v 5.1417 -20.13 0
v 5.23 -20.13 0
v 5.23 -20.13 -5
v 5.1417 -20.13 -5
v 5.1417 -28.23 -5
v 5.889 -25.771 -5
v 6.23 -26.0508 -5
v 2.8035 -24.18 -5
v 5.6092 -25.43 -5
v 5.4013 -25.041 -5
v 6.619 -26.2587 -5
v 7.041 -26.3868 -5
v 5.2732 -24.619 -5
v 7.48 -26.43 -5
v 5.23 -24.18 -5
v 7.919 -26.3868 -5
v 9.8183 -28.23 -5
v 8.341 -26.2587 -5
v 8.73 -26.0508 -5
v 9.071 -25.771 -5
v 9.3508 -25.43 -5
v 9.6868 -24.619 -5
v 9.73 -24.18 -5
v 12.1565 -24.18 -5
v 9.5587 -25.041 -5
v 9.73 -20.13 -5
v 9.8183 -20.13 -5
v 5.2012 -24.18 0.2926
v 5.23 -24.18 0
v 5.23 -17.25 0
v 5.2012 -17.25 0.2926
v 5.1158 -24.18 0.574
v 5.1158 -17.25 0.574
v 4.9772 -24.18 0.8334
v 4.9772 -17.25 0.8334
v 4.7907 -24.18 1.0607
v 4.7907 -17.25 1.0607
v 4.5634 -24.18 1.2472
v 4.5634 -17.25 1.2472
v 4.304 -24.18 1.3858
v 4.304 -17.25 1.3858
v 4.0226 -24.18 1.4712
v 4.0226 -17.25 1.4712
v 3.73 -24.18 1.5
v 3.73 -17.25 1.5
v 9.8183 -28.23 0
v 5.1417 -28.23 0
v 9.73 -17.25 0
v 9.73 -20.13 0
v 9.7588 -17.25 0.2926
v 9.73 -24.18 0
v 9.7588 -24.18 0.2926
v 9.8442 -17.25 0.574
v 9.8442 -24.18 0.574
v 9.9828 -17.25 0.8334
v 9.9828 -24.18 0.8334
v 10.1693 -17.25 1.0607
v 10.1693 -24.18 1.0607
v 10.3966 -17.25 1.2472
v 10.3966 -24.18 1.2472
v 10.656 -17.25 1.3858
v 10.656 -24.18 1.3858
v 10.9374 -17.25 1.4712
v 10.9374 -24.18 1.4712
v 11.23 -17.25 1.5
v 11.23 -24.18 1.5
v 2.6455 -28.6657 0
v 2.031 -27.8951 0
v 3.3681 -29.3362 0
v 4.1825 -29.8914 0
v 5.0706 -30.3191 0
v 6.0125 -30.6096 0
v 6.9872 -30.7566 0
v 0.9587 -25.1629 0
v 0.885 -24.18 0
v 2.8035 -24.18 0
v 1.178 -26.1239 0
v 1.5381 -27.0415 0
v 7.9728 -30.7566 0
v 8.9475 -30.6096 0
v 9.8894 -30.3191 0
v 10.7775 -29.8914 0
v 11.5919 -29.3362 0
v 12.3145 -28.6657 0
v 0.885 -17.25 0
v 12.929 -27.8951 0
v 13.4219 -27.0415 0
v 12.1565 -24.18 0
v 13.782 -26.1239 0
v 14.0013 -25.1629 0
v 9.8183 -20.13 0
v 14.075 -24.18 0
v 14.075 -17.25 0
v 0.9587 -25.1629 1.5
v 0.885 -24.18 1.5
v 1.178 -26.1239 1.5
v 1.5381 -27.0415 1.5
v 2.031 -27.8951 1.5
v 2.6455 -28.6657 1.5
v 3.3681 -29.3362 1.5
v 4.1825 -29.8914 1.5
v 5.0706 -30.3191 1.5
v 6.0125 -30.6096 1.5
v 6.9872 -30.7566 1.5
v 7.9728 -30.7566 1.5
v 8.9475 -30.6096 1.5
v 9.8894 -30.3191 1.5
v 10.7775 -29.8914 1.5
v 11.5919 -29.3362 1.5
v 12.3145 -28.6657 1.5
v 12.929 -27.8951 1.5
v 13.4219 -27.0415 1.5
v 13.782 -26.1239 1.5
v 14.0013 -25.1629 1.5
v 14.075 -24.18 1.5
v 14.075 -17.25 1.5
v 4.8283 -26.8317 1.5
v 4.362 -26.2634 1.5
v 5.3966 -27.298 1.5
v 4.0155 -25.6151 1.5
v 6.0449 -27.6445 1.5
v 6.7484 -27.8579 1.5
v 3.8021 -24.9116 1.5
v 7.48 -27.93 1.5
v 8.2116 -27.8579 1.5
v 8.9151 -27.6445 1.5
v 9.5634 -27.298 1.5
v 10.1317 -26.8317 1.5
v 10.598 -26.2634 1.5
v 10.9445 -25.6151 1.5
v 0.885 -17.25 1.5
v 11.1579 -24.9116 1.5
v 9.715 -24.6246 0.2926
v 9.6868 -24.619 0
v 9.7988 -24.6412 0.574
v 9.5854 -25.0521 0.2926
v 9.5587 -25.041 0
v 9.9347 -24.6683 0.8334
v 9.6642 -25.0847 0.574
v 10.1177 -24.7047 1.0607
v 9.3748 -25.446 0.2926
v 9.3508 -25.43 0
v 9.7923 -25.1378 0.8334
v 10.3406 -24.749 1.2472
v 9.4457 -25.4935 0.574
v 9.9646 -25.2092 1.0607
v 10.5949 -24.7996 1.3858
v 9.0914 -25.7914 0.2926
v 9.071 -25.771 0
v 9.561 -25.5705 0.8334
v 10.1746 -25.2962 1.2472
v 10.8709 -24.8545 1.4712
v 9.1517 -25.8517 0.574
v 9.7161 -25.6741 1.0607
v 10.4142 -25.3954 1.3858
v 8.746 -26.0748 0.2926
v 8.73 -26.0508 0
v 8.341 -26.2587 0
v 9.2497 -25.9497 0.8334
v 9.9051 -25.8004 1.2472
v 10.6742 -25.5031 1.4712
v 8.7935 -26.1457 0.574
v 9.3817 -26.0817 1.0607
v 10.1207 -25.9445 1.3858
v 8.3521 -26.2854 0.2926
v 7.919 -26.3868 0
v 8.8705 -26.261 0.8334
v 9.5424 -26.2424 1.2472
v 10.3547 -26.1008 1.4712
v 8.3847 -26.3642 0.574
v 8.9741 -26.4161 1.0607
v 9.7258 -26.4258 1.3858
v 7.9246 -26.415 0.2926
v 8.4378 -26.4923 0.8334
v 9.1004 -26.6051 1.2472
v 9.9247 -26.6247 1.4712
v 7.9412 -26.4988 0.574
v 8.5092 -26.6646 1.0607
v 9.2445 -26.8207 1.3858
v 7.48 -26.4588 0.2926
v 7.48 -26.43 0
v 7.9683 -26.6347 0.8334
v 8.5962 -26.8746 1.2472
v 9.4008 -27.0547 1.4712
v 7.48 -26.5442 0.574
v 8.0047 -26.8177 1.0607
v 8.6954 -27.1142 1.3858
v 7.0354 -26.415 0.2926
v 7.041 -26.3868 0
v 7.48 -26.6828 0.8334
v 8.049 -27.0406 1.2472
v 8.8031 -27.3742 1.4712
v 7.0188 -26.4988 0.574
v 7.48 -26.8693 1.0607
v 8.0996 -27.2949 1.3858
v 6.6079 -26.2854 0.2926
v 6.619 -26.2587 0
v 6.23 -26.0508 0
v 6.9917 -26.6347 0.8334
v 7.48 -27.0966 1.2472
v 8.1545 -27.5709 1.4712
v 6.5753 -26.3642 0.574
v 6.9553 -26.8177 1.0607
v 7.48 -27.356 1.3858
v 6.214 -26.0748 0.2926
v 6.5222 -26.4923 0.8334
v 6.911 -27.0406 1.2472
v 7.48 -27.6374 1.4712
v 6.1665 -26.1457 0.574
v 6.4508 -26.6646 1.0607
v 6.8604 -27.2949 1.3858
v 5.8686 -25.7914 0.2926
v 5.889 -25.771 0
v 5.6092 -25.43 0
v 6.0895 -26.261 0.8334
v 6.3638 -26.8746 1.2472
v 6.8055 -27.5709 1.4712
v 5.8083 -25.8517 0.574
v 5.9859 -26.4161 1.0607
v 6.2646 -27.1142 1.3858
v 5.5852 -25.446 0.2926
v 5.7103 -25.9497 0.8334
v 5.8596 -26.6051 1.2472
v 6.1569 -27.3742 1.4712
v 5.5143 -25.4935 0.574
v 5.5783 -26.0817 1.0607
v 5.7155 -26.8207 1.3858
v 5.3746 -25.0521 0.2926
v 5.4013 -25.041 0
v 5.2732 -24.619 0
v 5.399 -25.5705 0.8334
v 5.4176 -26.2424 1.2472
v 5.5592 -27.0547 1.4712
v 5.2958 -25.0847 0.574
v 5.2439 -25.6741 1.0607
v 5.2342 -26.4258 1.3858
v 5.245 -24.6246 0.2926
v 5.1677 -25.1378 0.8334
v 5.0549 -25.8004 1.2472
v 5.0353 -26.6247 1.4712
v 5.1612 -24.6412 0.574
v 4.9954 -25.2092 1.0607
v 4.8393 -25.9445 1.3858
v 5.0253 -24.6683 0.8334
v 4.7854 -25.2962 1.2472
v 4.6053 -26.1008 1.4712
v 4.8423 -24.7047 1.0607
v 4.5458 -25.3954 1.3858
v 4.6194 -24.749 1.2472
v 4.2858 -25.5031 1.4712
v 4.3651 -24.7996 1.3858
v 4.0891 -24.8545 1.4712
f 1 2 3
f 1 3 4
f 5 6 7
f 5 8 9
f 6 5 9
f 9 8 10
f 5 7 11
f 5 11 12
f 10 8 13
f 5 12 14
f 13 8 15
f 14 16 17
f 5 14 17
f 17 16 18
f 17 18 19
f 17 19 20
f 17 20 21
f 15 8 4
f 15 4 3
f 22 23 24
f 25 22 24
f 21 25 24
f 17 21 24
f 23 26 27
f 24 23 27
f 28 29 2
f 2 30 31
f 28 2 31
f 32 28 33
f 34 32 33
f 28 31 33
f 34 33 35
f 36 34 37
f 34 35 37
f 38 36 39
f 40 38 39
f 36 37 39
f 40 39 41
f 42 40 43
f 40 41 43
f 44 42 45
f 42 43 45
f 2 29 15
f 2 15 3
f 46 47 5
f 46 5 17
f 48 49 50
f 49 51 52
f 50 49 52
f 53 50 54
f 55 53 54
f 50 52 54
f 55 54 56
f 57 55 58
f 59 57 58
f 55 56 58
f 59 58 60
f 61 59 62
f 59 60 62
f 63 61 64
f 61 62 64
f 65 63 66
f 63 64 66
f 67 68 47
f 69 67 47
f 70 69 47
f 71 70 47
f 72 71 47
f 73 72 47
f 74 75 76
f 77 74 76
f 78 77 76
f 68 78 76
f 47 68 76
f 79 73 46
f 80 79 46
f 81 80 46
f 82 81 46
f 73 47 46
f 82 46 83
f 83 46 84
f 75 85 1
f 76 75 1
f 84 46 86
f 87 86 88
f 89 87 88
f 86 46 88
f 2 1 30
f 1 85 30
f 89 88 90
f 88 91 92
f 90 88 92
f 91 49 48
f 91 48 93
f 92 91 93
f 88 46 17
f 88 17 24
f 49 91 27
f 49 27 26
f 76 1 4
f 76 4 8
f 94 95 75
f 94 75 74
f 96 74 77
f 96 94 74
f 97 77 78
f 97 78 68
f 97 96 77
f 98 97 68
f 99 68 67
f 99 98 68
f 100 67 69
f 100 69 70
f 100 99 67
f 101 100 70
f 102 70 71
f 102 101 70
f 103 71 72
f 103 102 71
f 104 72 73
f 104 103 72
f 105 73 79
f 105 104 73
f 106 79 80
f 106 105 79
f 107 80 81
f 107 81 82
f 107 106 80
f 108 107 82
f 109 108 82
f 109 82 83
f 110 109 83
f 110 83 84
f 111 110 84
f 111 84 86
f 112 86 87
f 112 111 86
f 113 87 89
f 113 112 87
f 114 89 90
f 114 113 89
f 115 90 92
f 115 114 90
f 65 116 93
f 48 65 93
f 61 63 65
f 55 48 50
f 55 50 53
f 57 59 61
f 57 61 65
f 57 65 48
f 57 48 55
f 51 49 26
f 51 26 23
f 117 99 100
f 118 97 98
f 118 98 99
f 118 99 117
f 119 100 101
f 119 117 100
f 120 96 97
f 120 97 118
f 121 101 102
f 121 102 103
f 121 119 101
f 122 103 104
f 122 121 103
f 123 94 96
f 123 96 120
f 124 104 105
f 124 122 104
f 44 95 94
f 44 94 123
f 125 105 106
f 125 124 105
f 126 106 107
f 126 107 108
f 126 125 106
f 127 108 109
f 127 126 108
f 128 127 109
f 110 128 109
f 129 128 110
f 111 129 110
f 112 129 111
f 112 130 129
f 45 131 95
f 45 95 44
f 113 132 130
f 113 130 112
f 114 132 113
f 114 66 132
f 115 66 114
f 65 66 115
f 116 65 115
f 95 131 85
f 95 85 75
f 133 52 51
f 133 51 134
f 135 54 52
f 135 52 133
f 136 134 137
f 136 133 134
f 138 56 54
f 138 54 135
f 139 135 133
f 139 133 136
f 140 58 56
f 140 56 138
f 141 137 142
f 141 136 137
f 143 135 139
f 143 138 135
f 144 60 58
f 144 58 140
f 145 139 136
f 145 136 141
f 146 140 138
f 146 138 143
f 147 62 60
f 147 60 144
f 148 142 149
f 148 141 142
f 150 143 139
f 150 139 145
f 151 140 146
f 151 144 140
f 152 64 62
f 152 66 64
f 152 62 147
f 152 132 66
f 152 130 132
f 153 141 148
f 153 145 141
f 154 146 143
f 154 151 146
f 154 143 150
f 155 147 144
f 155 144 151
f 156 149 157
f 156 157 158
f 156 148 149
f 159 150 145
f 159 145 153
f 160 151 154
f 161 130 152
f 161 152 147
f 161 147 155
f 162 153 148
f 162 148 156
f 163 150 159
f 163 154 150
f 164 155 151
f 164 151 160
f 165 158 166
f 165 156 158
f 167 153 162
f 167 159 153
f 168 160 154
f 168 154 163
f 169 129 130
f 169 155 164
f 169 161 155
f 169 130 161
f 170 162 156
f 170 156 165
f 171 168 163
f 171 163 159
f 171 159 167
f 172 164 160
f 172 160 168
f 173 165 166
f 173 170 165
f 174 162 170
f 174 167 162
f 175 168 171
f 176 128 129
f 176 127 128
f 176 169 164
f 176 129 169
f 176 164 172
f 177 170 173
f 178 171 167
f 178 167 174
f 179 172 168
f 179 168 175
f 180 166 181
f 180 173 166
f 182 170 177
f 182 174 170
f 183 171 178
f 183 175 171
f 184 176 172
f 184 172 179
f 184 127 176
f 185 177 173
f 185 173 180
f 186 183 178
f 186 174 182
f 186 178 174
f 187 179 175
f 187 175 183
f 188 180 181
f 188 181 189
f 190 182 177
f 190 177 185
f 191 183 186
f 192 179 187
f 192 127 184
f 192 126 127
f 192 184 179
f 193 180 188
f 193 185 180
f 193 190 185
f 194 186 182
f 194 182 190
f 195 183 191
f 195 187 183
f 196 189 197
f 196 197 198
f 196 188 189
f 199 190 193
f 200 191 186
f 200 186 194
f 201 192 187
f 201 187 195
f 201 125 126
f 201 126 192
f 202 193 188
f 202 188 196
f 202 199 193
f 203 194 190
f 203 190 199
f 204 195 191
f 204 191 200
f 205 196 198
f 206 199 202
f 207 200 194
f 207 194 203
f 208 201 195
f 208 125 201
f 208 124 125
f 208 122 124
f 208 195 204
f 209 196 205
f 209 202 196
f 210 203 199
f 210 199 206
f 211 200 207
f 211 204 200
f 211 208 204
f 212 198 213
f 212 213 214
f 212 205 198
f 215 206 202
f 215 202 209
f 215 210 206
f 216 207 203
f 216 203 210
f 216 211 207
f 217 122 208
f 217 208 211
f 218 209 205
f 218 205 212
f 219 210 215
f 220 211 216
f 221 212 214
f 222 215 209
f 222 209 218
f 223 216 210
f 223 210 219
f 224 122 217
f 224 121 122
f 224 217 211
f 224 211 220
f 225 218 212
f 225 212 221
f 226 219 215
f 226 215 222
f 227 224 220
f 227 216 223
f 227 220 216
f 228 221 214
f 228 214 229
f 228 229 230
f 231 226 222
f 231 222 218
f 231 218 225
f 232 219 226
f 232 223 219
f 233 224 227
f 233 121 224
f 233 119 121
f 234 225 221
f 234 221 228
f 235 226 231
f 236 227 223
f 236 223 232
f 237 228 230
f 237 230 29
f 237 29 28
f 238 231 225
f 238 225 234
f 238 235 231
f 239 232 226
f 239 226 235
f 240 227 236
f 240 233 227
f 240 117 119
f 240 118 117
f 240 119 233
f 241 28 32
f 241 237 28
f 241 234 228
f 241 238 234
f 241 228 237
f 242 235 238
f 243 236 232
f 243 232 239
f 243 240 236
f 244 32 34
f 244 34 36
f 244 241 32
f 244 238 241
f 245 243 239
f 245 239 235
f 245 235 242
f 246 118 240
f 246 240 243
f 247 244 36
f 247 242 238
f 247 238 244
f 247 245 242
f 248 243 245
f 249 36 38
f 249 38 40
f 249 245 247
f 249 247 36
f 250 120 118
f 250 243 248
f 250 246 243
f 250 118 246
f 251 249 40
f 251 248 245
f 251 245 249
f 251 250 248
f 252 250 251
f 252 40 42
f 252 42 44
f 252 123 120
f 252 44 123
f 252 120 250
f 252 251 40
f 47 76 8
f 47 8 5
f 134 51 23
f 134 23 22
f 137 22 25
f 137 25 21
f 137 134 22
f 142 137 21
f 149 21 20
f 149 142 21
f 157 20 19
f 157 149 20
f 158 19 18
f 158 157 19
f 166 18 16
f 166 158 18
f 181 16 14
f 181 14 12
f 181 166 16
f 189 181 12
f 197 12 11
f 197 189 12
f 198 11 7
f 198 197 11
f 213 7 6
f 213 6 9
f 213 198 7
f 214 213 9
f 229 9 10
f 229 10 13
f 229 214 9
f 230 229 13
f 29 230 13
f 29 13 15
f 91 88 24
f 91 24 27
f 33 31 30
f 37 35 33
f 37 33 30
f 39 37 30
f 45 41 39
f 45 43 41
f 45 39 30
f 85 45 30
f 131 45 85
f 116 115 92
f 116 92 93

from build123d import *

# Parameters (mm, degrees)
BOSS_EXTRUDE1_DEPTH = 5
BOSS_EXTRUDE2_START = 1.5
BOSS_EXTRUDE2_DEPTH = 1.5
FILLET1_R           = 1.5


with BuildPart() as part:
    # Sketch1 → Boss-Extrude1 (new body)
    with BuildSketch(Plane.XY):
        with BuildLine():
            Line((9.73, -20.13), (9.73, -24.18))
            ThreePointArc((9.73, -24.18), (7.48, -26.43), (5.23, -24.18))
            Line((5.23, -24.18), (5.23, -20.13))
            Line((5.23, -20.13), (5.14173141, -20.13))
            Line((5.14173141, -20.13), (2.80346282, -24.18))
            Line((2.80346282, -24.18), (5.14173141, -28.23))
            Line((5.14173141, -28.23), (9.81826859, -28.23))
            Line((9.81826859, -28.23), (12.15653718, -24.18))
            Line((12.15653718, -24.18), (9.81826859, -20.13))
            Line((9.81826859, -20.13), (9.73, -20.13))
        make_face()
    extrude(amount=-BOSS_EXTRUDE1_DEPTH)

    # Sketch2 → Boss-Extrude2 (add)
    with BuildSketch(Plane.XY.offset(BOSS_EXTRUDE2_START)):
        with BuildLine():
            Line((0.885, -17.25), (0.885, -19.25))
            Line((0.885, -19.25), (0.885, -24.18))
            ThreePointArc((0.885, -24.18), (7.48, -30.775), (14.075, -24.18))
            Line((14.075, -24.18), (14.075, -17.25))
            Line((14.075, -17.25), (10.575, -17.25))
            Line((10.575, -17.25), (9.73, -17.25))
            Line((9.73, -17.25), (9.73, -20.13))
            Line((9.73, -20.13), (9.73, -24.18))
            ThreePointArc((9.73, -24.18), (7.48, -26.43), (5.23, -24.18))
            Line((5.23, -24.18), (5.23, -20.13))
            Line((5.23, -20.13), (5.23, -17.25))
            Line((5.23, -17.25), (0.885, -17.25))
        make_face()
    extrude(amount=-BOSS_EXTRUDE2_DEPTH)

    # Fillet1
    fillet1_edges = [part.edges().sort_by_distance(p)[0] for p in [
        (9.73, -20.715, 1.5),
        (7.48, -26.43, 1.5),
        (5.23, -20.715, 1.5),
    ]]
    fillet(fillet1_edges, radius=FILLET1_R)


solid = part.part
